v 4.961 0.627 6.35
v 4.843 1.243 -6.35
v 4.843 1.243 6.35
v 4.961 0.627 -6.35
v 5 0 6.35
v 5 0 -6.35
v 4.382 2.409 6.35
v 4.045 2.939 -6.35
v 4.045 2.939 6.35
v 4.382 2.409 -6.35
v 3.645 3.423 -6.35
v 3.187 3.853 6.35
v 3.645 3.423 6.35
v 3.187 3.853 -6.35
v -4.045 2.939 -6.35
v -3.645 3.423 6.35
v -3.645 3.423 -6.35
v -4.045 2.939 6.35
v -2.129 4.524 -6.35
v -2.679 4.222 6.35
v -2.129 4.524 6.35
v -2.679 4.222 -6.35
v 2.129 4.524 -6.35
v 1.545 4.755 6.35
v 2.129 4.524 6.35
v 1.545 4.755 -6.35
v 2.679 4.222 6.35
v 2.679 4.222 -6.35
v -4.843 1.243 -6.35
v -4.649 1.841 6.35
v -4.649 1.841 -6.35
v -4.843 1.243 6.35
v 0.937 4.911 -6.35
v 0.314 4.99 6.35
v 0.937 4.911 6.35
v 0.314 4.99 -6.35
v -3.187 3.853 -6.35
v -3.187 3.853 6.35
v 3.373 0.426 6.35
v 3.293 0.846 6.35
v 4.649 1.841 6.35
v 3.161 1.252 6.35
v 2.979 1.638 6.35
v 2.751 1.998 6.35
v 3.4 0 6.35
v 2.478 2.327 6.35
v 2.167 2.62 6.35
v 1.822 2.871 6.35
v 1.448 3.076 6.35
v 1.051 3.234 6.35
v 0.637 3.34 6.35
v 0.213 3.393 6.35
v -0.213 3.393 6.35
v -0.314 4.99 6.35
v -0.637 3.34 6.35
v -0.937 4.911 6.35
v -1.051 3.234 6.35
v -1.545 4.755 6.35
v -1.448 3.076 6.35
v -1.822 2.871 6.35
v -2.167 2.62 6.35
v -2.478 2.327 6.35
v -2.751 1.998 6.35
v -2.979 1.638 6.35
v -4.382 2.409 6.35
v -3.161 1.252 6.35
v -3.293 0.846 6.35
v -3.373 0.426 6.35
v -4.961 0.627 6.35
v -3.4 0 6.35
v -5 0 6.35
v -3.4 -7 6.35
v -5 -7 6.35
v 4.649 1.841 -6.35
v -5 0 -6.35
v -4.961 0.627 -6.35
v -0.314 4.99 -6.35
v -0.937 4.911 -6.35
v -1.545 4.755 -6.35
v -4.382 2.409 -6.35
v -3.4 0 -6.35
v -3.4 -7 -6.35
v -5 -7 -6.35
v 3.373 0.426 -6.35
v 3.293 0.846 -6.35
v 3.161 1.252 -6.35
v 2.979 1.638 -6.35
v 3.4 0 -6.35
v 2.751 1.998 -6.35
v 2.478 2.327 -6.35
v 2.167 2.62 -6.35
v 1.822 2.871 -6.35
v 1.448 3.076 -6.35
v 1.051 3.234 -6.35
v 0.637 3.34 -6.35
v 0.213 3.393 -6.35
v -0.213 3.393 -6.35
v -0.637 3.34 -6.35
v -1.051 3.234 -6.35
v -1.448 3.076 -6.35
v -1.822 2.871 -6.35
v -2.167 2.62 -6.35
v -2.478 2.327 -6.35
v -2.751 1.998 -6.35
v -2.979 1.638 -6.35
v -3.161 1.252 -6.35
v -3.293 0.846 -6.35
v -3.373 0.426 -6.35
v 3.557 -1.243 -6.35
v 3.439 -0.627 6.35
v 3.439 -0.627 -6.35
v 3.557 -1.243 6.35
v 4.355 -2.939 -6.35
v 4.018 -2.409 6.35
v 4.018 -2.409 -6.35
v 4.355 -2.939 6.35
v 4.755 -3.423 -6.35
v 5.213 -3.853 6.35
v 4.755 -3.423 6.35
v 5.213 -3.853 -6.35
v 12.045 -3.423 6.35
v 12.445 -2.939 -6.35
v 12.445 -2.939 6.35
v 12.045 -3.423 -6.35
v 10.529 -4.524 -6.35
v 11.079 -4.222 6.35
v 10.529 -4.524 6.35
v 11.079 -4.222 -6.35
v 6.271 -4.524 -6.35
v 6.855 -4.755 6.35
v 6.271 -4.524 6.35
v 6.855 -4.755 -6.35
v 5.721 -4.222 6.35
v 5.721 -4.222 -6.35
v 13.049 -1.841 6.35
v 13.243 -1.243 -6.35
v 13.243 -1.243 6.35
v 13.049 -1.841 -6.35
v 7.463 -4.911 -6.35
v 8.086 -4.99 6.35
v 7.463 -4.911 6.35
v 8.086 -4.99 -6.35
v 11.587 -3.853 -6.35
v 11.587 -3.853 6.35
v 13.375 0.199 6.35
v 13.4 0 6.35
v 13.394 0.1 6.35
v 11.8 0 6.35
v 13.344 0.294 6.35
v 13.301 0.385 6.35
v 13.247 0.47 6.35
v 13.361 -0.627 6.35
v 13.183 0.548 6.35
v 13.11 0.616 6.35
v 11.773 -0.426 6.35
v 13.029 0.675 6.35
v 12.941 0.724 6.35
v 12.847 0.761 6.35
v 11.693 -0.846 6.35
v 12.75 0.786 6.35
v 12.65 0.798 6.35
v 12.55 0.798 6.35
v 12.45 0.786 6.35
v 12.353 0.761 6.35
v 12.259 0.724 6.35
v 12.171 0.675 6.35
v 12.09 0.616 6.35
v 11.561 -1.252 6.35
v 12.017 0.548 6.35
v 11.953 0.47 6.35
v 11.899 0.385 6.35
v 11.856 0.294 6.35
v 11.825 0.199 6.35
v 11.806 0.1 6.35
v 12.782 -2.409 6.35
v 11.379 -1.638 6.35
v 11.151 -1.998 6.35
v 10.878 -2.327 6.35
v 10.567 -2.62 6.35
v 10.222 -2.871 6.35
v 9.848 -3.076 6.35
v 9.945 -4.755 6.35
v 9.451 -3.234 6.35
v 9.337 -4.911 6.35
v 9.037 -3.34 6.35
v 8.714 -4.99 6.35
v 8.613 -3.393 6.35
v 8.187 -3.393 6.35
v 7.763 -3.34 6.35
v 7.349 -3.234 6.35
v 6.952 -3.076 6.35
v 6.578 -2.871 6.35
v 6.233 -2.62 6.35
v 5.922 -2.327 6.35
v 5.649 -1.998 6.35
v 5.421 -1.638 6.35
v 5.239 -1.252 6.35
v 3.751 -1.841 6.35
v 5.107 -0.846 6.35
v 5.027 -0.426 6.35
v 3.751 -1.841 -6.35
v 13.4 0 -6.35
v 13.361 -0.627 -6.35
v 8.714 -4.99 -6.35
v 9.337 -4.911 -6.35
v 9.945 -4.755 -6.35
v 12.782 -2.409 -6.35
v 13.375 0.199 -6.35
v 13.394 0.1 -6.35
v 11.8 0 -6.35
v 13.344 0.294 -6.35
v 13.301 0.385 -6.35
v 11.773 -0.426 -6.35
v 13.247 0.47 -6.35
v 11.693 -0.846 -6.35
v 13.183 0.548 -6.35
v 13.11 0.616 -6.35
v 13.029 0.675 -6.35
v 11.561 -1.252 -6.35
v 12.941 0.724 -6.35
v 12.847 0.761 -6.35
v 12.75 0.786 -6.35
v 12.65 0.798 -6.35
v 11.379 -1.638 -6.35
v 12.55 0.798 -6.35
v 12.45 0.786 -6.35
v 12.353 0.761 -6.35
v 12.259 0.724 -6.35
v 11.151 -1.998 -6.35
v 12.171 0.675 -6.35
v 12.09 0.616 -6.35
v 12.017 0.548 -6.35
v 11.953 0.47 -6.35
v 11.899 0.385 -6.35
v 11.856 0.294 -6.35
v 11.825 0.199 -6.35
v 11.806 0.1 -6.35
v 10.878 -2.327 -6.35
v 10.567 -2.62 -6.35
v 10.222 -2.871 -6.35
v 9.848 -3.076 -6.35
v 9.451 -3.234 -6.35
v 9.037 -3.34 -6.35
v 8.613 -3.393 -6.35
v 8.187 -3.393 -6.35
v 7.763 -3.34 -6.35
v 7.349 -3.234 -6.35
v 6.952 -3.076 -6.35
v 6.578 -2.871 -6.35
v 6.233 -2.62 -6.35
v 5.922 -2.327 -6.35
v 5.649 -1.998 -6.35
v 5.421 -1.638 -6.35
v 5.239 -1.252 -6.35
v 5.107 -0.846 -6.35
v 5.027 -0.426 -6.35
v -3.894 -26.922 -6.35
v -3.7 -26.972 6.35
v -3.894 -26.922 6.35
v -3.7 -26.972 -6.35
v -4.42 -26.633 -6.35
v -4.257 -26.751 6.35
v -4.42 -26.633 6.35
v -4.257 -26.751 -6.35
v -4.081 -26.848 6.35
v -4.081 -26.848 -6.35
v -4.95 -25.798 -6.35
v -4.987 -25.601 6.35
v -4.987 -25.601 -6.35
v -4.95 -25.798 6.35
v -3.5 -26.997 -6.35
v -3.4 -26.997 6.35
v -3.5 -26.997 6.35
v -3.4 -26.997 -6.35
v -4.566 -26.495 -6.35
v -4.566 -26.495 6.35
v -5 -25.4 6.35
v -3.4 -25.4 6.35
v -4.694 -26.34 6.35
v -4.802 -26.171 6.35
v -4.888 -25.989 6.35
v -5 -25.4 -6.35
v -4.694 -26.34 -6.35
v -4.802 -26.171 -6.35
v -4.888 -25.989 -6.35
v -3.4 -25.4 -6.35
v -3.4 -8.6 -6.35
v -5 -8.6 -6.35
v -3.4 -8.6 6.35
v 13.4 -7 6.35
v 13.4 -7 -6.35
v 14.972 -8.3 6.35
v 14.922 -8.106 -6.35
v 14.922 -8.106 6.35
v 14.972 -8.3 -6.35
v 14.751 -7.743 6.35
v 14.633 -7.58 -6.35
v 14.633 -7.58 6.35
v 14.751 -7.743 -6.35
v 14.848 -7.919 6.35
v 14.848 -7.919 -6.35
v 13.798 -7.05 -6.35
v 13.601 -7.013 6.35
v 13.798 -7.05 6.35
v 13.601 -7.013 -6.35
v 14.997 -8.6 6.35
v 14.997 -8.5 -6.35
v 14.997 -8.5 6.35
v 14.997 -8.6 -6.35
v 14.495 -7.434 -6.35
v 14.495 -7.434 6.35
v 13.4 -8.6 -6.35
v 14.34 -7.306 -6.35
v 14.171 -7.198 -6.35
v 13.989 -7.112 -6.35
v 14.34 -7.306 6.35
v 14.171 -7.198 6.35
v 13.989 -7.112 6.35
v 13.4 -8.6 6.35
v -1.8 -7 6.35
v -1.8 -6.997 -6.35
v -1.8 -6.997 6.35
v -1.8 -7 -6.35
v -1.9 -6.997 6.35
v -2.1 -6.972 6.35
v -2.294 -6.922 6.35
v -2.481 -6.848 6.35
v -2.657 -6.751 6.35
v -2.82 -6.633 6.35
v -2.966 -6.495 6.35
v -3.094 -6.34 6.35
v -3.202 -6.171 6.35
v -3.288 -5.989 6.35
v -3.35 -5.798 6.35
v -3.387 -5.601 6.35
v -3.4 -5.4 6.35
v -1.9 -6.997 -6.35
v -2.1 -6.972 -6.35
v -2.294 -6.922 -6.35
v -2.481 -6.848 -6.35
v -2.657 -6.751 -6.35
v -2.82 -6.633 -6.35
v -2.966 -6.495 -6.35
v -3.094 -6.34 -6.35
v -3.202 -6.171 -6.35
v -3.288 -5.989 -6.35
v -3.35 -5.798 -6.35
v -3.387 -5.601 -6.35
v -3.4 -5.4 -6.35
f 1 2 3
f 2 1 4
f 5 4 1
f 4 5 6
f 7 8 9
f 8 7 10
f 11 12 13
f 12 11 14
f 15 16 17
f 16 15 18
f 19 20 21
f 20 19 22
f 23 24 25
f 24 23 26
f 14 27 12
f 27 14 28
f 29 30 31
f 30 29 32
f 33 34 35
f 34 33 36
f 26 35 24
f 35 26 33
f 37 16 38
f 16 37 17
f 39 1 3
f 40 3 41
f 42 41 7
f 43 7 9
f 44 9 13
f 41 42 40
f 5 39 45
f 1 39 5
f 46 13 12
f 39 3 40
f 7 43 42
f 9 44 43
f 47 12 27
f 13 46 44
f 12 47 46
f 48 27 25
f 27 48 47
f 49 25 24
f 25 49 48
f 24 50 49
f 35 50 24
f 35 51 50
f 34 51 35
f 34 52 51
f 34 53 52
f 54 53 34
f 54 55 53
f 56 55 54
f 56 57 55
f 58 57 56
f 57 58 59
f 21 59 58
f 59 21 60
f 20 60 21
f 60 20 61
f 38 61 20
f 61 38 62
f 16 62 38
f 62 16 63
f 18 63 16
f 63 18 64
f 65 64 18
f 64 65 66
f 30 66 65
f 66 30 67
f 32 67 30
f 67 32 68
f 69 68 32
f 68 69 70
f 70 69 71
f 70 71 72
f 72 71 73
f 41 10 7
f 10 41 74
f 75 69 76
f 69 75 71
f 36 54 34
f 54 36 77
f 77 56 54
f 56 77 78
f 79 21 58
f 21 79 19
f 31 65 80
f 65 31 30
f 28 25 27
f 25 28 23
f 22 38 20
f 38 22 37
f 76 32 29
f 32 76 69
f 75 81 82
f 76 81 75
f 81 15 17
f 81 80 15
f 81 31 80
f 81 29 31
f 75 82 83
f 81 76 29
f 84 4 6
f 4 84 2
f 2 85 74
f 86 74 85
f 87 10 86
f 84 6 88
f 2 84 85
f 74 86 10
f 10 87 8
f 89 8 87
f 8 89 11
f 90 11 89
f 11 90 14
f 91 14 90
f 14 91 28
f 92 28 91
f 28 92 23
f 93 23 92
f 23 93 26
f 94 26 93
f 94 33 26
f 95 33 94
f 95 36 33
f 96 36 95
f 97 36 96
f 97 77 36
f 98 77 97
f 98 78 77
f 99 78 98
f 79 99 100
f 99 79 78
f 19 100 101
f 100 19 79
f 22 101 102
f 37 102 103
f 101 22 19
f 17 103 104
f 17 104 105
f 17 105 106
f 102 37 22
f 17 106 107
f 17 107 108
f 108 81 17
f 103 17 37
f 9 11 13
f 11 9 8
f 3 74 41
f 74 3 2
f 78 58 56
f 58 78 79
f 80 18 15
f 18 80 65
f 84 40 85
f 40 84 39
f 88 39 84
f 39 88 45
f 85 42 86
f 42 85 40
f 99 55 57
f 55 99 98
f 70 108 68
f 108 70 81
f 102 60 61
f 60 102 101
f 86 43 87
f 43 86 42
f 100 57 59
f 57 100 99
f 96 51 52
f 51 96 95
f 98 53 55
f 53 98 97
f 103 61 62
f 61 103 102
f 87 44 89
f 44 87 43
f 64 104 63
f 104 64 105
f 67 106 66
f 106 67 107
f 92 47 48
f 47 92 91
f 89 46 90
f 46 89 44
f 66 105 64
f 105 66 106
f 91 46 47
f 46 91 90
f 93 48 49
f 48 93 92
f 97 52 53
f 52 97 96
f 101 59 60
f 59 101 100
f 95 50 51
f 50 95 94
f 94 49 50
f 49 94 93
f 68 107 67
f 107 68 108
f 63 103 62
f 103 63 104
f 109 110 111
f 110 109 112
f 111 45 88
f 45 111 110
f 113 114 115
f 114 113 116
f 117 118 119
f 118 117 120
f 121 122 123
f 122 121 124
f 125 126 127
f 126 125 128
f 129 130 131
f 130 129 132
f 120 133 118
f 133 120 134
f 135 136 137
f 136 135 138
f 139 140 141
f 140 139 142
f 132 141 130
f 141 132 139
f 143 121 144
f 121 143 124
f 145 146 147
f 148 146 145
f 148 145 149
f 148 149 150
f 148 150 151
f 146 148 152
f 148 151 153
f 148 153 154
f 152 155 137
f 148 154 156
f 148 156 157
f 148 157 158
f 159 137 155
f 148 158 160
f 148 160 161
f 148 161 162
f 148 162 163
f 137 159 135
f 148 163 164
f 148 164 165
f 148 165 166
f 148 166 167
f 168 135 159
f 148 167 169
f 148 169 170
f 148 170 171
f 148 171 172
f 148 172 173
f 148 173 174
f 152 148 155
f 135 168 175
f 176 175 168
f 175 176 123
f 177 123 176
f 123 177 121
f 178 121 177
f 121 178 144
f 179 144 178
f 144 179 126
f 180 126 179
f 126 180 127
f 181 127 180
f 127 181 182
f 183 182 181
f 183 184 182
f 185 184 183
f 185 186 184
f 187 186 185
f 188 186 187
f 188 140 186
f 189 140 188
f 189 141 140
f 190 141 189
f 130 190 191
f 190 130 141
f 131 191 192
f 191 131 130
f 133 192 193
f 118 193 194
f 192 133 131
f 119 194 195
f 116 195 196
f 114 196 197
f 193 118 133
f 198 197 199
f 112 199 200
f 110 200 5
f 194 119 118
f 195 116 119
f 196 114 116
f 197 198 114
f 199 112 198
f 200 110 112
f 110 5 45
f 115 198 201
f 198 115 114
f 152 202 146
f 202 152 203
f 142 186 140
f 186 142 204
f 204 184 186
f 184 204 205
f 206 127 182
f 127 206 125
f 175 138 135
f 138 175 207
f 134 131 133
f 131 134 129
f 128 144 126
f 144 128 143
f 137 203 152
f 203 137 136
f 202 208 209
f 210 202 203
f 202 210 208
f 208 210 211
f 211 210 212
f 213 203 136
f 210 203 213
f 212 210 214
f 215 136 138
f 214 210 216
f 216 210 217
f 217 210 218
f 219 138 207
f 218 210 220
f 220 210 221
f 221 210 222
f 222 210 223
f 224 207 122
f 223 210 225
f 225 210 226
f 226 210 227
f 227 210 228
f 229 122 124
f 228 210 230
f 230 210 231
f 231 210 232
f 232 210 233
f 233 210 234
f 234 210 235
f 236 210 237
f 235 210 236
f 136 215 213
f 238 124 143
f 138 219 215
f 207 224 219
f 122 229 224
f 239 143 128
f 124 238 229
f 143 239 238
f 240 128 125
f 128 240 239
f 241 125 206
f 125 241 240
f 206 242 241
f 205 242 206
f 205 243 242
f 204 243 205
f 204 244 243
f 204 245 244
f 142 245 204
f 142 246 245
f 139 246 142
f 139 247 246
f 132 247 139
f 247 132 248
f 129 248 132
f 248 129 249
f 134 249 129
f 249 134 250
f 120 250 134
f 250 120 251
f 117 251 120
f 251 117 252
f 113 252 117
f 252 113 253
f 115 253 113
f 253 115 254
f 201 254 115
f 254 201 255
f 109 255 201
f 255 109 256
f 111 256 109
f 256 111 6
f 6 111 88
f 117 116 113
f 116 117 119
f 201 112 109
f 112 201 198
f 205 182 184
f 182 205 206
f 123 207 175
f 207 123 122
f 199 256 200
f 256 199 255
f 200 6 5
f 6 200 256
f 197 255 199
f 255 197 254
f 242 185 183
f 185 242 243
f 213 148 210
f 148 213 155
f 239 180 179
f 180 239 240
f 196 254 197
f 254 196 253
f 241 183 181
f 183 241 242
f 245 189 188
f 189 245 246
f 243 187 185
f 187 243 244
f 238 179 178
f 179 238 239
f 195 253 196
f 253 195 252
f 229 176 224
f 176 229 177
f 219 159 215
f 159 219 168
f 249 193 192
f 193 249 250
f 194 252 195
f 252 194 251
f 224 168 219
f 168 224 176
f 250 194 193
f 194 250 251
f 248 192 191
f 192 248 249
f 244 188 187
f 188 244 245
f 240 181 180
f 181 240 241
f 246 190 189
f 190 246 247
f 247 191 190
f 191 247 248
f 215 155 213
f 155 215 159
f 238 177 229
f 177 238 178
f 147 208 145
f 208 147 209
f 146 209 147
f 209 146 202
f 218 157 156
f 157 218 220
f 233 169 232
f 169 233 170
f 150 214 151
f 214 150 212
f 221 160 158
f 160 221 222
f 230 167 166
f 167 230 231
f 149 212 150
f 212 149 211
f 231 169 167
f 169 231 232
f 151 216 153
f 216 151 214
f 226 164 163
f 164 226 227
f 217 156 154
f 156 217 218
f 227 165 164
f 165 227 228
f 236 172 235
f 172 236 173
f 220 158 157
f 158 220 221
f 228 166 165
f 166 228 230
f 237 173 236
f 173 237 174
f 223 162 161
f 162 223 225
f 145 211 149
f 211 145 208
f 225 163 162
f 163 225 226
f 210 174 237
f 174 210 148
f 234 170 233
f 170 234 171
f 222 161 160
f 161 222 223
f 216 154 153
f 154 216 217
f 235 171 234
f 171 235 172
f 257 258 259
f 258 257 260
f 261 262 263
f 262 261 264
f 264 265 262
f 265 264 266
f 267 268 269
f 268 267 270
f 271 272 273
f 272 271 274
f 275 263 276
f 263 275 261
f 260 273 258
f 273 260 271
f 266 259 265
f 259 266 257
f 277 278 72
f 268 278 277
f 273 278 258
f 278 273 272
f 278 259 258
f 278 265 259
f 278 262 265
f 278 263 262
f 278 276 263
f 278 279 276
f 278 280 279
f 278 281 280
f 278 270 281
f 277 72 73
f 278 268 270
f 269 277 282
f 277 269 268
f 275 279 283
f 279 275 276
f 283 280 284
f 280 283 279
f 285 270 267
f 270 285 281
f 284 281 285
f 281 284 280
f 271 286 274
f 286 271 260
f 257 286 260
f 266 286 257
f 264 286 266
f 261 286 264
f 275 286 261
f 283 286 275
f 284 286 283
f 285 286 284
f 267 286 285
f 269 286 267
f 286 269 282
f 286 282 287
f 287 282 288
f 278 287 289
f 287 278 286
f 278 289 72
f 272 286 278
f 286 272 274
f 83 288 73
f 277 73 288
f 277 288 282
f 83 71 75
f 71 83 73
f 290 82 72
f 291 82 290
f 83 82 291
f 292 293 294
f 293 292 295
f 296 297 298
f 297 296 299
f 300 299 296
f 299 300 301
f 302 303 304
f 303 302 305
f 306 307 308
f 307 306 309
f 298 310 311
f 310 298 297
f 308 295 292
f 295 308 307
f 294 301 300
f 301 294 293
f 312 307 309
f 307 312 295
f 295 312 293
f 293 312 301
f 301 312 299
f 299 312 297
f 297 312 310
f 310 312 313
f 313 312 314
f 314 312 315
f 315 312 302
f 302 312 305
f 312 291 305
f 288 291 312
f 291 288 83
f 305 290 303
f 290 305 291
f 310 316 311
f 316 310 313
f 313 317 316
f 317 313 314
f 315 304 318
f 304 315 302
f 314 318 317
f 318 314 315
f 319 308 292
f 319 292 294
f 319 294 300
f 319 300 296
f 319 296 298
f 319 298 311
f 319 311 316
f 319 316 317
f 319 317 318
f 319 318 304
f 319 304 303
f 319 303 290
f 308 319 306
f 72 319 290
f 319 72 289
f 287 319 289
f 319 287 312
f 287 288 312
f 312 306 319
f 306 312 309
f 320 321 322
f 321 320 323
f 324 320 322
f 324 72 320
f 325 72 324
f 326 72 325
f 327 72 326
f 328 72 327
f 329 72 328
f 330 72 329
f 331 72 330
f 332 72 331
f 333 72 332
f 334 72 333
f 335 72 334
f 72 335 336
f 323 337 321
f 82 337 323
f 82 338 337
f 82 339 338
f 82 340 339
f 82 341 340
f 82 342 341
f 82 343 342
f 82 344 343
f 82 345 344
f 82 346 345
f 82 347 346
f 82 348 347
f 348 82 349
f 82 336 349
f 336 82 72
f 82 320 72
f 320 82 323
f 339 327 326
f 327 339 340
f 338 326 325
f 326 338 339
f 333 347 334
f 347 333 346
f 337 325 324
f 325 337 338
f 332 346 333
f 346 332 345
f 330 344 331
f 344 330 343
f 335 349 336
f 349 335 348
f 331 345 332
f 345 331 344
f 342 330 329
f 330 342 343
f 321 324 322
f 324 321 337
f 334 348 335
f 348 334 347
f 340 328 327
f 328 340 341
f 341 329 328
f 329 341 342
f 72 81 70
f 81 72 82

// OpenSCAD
bend_d = 10;
arm_t = 1.6;
clip_w = 12.7;
fudge = 0.01;
clearance = 2;
side_len = bend_d * 2 - arm_t;

bend_r = bend_d / 2;
fillet_r = arm_t / 2;

module half_hollow() {
  difference() {
    cylinder(r=bend_r, h = clip_w, center=true, $fn = 50);
    cylinder(r=bend_r - arm_t, h = clip_w + fudge*2, center=true, $fn = 50);
    translate([0, -bend_r, 0])
      cube(size=[bend_d + fudge, bend_d, clip_w + fudge], center=true);
  }
}

module wave() {
  half_hollow();
  translate([bend_d - arm_t, 0, 0]) rotate([0, 0, 180]) half_hollow();
  translate([bend_d - arm_t + bend_r - fillet_r, 0, 0])
    cylinder(r=fillet_r, h=clip_w, center=true, $fn=50);
}

module ell_side(flip_fillet, flip_cut) {
  translate([0, 0, -clip_w/2]){
    cube(size=[arm_t, side_len, clip_w], center=false);
    difference() {
      translate([flip_fillet * arm_t, side_len, 0])
        cylinder(r=arm_t, h=clip_w, center=false, $fn=50);
      translate([arm_t * flip_cut, side_len - arm_t, 0])
        cube(size=[arm_t, arm_t *2, clip_w], center=false);
    }
  }
}

module corner(radius) {
  translate([radius, radius, -clip_w / 2])
  difference() {
    translate([-radius, -radius, 0])
      cube(size=[radius, radius, clip_w], center=false);
    cylinder(r=radius, h=clip_w, center=false, $fn=50);   
  }
}

module ell() {
  translate([-bend_r, -bend_r - clearance, 0]) {
   difference() {
    union() {
      translate([0, 0, -clip_w / 2])
        cube(size=[arm_t, bend_r + clearance, clip_w], center=false);
      rotate([0, 180, 180]) ell_side(1, 1);
	  rotate([0, 0, -90]) ell_side(1, 1);
      translate([arm_t, 0, 0])
        corner(arm_t);
    }
   //translate([0, -arm_t, 0])
   //corner(arm_t * 2);
   }
  }
}




wave();
ell();
